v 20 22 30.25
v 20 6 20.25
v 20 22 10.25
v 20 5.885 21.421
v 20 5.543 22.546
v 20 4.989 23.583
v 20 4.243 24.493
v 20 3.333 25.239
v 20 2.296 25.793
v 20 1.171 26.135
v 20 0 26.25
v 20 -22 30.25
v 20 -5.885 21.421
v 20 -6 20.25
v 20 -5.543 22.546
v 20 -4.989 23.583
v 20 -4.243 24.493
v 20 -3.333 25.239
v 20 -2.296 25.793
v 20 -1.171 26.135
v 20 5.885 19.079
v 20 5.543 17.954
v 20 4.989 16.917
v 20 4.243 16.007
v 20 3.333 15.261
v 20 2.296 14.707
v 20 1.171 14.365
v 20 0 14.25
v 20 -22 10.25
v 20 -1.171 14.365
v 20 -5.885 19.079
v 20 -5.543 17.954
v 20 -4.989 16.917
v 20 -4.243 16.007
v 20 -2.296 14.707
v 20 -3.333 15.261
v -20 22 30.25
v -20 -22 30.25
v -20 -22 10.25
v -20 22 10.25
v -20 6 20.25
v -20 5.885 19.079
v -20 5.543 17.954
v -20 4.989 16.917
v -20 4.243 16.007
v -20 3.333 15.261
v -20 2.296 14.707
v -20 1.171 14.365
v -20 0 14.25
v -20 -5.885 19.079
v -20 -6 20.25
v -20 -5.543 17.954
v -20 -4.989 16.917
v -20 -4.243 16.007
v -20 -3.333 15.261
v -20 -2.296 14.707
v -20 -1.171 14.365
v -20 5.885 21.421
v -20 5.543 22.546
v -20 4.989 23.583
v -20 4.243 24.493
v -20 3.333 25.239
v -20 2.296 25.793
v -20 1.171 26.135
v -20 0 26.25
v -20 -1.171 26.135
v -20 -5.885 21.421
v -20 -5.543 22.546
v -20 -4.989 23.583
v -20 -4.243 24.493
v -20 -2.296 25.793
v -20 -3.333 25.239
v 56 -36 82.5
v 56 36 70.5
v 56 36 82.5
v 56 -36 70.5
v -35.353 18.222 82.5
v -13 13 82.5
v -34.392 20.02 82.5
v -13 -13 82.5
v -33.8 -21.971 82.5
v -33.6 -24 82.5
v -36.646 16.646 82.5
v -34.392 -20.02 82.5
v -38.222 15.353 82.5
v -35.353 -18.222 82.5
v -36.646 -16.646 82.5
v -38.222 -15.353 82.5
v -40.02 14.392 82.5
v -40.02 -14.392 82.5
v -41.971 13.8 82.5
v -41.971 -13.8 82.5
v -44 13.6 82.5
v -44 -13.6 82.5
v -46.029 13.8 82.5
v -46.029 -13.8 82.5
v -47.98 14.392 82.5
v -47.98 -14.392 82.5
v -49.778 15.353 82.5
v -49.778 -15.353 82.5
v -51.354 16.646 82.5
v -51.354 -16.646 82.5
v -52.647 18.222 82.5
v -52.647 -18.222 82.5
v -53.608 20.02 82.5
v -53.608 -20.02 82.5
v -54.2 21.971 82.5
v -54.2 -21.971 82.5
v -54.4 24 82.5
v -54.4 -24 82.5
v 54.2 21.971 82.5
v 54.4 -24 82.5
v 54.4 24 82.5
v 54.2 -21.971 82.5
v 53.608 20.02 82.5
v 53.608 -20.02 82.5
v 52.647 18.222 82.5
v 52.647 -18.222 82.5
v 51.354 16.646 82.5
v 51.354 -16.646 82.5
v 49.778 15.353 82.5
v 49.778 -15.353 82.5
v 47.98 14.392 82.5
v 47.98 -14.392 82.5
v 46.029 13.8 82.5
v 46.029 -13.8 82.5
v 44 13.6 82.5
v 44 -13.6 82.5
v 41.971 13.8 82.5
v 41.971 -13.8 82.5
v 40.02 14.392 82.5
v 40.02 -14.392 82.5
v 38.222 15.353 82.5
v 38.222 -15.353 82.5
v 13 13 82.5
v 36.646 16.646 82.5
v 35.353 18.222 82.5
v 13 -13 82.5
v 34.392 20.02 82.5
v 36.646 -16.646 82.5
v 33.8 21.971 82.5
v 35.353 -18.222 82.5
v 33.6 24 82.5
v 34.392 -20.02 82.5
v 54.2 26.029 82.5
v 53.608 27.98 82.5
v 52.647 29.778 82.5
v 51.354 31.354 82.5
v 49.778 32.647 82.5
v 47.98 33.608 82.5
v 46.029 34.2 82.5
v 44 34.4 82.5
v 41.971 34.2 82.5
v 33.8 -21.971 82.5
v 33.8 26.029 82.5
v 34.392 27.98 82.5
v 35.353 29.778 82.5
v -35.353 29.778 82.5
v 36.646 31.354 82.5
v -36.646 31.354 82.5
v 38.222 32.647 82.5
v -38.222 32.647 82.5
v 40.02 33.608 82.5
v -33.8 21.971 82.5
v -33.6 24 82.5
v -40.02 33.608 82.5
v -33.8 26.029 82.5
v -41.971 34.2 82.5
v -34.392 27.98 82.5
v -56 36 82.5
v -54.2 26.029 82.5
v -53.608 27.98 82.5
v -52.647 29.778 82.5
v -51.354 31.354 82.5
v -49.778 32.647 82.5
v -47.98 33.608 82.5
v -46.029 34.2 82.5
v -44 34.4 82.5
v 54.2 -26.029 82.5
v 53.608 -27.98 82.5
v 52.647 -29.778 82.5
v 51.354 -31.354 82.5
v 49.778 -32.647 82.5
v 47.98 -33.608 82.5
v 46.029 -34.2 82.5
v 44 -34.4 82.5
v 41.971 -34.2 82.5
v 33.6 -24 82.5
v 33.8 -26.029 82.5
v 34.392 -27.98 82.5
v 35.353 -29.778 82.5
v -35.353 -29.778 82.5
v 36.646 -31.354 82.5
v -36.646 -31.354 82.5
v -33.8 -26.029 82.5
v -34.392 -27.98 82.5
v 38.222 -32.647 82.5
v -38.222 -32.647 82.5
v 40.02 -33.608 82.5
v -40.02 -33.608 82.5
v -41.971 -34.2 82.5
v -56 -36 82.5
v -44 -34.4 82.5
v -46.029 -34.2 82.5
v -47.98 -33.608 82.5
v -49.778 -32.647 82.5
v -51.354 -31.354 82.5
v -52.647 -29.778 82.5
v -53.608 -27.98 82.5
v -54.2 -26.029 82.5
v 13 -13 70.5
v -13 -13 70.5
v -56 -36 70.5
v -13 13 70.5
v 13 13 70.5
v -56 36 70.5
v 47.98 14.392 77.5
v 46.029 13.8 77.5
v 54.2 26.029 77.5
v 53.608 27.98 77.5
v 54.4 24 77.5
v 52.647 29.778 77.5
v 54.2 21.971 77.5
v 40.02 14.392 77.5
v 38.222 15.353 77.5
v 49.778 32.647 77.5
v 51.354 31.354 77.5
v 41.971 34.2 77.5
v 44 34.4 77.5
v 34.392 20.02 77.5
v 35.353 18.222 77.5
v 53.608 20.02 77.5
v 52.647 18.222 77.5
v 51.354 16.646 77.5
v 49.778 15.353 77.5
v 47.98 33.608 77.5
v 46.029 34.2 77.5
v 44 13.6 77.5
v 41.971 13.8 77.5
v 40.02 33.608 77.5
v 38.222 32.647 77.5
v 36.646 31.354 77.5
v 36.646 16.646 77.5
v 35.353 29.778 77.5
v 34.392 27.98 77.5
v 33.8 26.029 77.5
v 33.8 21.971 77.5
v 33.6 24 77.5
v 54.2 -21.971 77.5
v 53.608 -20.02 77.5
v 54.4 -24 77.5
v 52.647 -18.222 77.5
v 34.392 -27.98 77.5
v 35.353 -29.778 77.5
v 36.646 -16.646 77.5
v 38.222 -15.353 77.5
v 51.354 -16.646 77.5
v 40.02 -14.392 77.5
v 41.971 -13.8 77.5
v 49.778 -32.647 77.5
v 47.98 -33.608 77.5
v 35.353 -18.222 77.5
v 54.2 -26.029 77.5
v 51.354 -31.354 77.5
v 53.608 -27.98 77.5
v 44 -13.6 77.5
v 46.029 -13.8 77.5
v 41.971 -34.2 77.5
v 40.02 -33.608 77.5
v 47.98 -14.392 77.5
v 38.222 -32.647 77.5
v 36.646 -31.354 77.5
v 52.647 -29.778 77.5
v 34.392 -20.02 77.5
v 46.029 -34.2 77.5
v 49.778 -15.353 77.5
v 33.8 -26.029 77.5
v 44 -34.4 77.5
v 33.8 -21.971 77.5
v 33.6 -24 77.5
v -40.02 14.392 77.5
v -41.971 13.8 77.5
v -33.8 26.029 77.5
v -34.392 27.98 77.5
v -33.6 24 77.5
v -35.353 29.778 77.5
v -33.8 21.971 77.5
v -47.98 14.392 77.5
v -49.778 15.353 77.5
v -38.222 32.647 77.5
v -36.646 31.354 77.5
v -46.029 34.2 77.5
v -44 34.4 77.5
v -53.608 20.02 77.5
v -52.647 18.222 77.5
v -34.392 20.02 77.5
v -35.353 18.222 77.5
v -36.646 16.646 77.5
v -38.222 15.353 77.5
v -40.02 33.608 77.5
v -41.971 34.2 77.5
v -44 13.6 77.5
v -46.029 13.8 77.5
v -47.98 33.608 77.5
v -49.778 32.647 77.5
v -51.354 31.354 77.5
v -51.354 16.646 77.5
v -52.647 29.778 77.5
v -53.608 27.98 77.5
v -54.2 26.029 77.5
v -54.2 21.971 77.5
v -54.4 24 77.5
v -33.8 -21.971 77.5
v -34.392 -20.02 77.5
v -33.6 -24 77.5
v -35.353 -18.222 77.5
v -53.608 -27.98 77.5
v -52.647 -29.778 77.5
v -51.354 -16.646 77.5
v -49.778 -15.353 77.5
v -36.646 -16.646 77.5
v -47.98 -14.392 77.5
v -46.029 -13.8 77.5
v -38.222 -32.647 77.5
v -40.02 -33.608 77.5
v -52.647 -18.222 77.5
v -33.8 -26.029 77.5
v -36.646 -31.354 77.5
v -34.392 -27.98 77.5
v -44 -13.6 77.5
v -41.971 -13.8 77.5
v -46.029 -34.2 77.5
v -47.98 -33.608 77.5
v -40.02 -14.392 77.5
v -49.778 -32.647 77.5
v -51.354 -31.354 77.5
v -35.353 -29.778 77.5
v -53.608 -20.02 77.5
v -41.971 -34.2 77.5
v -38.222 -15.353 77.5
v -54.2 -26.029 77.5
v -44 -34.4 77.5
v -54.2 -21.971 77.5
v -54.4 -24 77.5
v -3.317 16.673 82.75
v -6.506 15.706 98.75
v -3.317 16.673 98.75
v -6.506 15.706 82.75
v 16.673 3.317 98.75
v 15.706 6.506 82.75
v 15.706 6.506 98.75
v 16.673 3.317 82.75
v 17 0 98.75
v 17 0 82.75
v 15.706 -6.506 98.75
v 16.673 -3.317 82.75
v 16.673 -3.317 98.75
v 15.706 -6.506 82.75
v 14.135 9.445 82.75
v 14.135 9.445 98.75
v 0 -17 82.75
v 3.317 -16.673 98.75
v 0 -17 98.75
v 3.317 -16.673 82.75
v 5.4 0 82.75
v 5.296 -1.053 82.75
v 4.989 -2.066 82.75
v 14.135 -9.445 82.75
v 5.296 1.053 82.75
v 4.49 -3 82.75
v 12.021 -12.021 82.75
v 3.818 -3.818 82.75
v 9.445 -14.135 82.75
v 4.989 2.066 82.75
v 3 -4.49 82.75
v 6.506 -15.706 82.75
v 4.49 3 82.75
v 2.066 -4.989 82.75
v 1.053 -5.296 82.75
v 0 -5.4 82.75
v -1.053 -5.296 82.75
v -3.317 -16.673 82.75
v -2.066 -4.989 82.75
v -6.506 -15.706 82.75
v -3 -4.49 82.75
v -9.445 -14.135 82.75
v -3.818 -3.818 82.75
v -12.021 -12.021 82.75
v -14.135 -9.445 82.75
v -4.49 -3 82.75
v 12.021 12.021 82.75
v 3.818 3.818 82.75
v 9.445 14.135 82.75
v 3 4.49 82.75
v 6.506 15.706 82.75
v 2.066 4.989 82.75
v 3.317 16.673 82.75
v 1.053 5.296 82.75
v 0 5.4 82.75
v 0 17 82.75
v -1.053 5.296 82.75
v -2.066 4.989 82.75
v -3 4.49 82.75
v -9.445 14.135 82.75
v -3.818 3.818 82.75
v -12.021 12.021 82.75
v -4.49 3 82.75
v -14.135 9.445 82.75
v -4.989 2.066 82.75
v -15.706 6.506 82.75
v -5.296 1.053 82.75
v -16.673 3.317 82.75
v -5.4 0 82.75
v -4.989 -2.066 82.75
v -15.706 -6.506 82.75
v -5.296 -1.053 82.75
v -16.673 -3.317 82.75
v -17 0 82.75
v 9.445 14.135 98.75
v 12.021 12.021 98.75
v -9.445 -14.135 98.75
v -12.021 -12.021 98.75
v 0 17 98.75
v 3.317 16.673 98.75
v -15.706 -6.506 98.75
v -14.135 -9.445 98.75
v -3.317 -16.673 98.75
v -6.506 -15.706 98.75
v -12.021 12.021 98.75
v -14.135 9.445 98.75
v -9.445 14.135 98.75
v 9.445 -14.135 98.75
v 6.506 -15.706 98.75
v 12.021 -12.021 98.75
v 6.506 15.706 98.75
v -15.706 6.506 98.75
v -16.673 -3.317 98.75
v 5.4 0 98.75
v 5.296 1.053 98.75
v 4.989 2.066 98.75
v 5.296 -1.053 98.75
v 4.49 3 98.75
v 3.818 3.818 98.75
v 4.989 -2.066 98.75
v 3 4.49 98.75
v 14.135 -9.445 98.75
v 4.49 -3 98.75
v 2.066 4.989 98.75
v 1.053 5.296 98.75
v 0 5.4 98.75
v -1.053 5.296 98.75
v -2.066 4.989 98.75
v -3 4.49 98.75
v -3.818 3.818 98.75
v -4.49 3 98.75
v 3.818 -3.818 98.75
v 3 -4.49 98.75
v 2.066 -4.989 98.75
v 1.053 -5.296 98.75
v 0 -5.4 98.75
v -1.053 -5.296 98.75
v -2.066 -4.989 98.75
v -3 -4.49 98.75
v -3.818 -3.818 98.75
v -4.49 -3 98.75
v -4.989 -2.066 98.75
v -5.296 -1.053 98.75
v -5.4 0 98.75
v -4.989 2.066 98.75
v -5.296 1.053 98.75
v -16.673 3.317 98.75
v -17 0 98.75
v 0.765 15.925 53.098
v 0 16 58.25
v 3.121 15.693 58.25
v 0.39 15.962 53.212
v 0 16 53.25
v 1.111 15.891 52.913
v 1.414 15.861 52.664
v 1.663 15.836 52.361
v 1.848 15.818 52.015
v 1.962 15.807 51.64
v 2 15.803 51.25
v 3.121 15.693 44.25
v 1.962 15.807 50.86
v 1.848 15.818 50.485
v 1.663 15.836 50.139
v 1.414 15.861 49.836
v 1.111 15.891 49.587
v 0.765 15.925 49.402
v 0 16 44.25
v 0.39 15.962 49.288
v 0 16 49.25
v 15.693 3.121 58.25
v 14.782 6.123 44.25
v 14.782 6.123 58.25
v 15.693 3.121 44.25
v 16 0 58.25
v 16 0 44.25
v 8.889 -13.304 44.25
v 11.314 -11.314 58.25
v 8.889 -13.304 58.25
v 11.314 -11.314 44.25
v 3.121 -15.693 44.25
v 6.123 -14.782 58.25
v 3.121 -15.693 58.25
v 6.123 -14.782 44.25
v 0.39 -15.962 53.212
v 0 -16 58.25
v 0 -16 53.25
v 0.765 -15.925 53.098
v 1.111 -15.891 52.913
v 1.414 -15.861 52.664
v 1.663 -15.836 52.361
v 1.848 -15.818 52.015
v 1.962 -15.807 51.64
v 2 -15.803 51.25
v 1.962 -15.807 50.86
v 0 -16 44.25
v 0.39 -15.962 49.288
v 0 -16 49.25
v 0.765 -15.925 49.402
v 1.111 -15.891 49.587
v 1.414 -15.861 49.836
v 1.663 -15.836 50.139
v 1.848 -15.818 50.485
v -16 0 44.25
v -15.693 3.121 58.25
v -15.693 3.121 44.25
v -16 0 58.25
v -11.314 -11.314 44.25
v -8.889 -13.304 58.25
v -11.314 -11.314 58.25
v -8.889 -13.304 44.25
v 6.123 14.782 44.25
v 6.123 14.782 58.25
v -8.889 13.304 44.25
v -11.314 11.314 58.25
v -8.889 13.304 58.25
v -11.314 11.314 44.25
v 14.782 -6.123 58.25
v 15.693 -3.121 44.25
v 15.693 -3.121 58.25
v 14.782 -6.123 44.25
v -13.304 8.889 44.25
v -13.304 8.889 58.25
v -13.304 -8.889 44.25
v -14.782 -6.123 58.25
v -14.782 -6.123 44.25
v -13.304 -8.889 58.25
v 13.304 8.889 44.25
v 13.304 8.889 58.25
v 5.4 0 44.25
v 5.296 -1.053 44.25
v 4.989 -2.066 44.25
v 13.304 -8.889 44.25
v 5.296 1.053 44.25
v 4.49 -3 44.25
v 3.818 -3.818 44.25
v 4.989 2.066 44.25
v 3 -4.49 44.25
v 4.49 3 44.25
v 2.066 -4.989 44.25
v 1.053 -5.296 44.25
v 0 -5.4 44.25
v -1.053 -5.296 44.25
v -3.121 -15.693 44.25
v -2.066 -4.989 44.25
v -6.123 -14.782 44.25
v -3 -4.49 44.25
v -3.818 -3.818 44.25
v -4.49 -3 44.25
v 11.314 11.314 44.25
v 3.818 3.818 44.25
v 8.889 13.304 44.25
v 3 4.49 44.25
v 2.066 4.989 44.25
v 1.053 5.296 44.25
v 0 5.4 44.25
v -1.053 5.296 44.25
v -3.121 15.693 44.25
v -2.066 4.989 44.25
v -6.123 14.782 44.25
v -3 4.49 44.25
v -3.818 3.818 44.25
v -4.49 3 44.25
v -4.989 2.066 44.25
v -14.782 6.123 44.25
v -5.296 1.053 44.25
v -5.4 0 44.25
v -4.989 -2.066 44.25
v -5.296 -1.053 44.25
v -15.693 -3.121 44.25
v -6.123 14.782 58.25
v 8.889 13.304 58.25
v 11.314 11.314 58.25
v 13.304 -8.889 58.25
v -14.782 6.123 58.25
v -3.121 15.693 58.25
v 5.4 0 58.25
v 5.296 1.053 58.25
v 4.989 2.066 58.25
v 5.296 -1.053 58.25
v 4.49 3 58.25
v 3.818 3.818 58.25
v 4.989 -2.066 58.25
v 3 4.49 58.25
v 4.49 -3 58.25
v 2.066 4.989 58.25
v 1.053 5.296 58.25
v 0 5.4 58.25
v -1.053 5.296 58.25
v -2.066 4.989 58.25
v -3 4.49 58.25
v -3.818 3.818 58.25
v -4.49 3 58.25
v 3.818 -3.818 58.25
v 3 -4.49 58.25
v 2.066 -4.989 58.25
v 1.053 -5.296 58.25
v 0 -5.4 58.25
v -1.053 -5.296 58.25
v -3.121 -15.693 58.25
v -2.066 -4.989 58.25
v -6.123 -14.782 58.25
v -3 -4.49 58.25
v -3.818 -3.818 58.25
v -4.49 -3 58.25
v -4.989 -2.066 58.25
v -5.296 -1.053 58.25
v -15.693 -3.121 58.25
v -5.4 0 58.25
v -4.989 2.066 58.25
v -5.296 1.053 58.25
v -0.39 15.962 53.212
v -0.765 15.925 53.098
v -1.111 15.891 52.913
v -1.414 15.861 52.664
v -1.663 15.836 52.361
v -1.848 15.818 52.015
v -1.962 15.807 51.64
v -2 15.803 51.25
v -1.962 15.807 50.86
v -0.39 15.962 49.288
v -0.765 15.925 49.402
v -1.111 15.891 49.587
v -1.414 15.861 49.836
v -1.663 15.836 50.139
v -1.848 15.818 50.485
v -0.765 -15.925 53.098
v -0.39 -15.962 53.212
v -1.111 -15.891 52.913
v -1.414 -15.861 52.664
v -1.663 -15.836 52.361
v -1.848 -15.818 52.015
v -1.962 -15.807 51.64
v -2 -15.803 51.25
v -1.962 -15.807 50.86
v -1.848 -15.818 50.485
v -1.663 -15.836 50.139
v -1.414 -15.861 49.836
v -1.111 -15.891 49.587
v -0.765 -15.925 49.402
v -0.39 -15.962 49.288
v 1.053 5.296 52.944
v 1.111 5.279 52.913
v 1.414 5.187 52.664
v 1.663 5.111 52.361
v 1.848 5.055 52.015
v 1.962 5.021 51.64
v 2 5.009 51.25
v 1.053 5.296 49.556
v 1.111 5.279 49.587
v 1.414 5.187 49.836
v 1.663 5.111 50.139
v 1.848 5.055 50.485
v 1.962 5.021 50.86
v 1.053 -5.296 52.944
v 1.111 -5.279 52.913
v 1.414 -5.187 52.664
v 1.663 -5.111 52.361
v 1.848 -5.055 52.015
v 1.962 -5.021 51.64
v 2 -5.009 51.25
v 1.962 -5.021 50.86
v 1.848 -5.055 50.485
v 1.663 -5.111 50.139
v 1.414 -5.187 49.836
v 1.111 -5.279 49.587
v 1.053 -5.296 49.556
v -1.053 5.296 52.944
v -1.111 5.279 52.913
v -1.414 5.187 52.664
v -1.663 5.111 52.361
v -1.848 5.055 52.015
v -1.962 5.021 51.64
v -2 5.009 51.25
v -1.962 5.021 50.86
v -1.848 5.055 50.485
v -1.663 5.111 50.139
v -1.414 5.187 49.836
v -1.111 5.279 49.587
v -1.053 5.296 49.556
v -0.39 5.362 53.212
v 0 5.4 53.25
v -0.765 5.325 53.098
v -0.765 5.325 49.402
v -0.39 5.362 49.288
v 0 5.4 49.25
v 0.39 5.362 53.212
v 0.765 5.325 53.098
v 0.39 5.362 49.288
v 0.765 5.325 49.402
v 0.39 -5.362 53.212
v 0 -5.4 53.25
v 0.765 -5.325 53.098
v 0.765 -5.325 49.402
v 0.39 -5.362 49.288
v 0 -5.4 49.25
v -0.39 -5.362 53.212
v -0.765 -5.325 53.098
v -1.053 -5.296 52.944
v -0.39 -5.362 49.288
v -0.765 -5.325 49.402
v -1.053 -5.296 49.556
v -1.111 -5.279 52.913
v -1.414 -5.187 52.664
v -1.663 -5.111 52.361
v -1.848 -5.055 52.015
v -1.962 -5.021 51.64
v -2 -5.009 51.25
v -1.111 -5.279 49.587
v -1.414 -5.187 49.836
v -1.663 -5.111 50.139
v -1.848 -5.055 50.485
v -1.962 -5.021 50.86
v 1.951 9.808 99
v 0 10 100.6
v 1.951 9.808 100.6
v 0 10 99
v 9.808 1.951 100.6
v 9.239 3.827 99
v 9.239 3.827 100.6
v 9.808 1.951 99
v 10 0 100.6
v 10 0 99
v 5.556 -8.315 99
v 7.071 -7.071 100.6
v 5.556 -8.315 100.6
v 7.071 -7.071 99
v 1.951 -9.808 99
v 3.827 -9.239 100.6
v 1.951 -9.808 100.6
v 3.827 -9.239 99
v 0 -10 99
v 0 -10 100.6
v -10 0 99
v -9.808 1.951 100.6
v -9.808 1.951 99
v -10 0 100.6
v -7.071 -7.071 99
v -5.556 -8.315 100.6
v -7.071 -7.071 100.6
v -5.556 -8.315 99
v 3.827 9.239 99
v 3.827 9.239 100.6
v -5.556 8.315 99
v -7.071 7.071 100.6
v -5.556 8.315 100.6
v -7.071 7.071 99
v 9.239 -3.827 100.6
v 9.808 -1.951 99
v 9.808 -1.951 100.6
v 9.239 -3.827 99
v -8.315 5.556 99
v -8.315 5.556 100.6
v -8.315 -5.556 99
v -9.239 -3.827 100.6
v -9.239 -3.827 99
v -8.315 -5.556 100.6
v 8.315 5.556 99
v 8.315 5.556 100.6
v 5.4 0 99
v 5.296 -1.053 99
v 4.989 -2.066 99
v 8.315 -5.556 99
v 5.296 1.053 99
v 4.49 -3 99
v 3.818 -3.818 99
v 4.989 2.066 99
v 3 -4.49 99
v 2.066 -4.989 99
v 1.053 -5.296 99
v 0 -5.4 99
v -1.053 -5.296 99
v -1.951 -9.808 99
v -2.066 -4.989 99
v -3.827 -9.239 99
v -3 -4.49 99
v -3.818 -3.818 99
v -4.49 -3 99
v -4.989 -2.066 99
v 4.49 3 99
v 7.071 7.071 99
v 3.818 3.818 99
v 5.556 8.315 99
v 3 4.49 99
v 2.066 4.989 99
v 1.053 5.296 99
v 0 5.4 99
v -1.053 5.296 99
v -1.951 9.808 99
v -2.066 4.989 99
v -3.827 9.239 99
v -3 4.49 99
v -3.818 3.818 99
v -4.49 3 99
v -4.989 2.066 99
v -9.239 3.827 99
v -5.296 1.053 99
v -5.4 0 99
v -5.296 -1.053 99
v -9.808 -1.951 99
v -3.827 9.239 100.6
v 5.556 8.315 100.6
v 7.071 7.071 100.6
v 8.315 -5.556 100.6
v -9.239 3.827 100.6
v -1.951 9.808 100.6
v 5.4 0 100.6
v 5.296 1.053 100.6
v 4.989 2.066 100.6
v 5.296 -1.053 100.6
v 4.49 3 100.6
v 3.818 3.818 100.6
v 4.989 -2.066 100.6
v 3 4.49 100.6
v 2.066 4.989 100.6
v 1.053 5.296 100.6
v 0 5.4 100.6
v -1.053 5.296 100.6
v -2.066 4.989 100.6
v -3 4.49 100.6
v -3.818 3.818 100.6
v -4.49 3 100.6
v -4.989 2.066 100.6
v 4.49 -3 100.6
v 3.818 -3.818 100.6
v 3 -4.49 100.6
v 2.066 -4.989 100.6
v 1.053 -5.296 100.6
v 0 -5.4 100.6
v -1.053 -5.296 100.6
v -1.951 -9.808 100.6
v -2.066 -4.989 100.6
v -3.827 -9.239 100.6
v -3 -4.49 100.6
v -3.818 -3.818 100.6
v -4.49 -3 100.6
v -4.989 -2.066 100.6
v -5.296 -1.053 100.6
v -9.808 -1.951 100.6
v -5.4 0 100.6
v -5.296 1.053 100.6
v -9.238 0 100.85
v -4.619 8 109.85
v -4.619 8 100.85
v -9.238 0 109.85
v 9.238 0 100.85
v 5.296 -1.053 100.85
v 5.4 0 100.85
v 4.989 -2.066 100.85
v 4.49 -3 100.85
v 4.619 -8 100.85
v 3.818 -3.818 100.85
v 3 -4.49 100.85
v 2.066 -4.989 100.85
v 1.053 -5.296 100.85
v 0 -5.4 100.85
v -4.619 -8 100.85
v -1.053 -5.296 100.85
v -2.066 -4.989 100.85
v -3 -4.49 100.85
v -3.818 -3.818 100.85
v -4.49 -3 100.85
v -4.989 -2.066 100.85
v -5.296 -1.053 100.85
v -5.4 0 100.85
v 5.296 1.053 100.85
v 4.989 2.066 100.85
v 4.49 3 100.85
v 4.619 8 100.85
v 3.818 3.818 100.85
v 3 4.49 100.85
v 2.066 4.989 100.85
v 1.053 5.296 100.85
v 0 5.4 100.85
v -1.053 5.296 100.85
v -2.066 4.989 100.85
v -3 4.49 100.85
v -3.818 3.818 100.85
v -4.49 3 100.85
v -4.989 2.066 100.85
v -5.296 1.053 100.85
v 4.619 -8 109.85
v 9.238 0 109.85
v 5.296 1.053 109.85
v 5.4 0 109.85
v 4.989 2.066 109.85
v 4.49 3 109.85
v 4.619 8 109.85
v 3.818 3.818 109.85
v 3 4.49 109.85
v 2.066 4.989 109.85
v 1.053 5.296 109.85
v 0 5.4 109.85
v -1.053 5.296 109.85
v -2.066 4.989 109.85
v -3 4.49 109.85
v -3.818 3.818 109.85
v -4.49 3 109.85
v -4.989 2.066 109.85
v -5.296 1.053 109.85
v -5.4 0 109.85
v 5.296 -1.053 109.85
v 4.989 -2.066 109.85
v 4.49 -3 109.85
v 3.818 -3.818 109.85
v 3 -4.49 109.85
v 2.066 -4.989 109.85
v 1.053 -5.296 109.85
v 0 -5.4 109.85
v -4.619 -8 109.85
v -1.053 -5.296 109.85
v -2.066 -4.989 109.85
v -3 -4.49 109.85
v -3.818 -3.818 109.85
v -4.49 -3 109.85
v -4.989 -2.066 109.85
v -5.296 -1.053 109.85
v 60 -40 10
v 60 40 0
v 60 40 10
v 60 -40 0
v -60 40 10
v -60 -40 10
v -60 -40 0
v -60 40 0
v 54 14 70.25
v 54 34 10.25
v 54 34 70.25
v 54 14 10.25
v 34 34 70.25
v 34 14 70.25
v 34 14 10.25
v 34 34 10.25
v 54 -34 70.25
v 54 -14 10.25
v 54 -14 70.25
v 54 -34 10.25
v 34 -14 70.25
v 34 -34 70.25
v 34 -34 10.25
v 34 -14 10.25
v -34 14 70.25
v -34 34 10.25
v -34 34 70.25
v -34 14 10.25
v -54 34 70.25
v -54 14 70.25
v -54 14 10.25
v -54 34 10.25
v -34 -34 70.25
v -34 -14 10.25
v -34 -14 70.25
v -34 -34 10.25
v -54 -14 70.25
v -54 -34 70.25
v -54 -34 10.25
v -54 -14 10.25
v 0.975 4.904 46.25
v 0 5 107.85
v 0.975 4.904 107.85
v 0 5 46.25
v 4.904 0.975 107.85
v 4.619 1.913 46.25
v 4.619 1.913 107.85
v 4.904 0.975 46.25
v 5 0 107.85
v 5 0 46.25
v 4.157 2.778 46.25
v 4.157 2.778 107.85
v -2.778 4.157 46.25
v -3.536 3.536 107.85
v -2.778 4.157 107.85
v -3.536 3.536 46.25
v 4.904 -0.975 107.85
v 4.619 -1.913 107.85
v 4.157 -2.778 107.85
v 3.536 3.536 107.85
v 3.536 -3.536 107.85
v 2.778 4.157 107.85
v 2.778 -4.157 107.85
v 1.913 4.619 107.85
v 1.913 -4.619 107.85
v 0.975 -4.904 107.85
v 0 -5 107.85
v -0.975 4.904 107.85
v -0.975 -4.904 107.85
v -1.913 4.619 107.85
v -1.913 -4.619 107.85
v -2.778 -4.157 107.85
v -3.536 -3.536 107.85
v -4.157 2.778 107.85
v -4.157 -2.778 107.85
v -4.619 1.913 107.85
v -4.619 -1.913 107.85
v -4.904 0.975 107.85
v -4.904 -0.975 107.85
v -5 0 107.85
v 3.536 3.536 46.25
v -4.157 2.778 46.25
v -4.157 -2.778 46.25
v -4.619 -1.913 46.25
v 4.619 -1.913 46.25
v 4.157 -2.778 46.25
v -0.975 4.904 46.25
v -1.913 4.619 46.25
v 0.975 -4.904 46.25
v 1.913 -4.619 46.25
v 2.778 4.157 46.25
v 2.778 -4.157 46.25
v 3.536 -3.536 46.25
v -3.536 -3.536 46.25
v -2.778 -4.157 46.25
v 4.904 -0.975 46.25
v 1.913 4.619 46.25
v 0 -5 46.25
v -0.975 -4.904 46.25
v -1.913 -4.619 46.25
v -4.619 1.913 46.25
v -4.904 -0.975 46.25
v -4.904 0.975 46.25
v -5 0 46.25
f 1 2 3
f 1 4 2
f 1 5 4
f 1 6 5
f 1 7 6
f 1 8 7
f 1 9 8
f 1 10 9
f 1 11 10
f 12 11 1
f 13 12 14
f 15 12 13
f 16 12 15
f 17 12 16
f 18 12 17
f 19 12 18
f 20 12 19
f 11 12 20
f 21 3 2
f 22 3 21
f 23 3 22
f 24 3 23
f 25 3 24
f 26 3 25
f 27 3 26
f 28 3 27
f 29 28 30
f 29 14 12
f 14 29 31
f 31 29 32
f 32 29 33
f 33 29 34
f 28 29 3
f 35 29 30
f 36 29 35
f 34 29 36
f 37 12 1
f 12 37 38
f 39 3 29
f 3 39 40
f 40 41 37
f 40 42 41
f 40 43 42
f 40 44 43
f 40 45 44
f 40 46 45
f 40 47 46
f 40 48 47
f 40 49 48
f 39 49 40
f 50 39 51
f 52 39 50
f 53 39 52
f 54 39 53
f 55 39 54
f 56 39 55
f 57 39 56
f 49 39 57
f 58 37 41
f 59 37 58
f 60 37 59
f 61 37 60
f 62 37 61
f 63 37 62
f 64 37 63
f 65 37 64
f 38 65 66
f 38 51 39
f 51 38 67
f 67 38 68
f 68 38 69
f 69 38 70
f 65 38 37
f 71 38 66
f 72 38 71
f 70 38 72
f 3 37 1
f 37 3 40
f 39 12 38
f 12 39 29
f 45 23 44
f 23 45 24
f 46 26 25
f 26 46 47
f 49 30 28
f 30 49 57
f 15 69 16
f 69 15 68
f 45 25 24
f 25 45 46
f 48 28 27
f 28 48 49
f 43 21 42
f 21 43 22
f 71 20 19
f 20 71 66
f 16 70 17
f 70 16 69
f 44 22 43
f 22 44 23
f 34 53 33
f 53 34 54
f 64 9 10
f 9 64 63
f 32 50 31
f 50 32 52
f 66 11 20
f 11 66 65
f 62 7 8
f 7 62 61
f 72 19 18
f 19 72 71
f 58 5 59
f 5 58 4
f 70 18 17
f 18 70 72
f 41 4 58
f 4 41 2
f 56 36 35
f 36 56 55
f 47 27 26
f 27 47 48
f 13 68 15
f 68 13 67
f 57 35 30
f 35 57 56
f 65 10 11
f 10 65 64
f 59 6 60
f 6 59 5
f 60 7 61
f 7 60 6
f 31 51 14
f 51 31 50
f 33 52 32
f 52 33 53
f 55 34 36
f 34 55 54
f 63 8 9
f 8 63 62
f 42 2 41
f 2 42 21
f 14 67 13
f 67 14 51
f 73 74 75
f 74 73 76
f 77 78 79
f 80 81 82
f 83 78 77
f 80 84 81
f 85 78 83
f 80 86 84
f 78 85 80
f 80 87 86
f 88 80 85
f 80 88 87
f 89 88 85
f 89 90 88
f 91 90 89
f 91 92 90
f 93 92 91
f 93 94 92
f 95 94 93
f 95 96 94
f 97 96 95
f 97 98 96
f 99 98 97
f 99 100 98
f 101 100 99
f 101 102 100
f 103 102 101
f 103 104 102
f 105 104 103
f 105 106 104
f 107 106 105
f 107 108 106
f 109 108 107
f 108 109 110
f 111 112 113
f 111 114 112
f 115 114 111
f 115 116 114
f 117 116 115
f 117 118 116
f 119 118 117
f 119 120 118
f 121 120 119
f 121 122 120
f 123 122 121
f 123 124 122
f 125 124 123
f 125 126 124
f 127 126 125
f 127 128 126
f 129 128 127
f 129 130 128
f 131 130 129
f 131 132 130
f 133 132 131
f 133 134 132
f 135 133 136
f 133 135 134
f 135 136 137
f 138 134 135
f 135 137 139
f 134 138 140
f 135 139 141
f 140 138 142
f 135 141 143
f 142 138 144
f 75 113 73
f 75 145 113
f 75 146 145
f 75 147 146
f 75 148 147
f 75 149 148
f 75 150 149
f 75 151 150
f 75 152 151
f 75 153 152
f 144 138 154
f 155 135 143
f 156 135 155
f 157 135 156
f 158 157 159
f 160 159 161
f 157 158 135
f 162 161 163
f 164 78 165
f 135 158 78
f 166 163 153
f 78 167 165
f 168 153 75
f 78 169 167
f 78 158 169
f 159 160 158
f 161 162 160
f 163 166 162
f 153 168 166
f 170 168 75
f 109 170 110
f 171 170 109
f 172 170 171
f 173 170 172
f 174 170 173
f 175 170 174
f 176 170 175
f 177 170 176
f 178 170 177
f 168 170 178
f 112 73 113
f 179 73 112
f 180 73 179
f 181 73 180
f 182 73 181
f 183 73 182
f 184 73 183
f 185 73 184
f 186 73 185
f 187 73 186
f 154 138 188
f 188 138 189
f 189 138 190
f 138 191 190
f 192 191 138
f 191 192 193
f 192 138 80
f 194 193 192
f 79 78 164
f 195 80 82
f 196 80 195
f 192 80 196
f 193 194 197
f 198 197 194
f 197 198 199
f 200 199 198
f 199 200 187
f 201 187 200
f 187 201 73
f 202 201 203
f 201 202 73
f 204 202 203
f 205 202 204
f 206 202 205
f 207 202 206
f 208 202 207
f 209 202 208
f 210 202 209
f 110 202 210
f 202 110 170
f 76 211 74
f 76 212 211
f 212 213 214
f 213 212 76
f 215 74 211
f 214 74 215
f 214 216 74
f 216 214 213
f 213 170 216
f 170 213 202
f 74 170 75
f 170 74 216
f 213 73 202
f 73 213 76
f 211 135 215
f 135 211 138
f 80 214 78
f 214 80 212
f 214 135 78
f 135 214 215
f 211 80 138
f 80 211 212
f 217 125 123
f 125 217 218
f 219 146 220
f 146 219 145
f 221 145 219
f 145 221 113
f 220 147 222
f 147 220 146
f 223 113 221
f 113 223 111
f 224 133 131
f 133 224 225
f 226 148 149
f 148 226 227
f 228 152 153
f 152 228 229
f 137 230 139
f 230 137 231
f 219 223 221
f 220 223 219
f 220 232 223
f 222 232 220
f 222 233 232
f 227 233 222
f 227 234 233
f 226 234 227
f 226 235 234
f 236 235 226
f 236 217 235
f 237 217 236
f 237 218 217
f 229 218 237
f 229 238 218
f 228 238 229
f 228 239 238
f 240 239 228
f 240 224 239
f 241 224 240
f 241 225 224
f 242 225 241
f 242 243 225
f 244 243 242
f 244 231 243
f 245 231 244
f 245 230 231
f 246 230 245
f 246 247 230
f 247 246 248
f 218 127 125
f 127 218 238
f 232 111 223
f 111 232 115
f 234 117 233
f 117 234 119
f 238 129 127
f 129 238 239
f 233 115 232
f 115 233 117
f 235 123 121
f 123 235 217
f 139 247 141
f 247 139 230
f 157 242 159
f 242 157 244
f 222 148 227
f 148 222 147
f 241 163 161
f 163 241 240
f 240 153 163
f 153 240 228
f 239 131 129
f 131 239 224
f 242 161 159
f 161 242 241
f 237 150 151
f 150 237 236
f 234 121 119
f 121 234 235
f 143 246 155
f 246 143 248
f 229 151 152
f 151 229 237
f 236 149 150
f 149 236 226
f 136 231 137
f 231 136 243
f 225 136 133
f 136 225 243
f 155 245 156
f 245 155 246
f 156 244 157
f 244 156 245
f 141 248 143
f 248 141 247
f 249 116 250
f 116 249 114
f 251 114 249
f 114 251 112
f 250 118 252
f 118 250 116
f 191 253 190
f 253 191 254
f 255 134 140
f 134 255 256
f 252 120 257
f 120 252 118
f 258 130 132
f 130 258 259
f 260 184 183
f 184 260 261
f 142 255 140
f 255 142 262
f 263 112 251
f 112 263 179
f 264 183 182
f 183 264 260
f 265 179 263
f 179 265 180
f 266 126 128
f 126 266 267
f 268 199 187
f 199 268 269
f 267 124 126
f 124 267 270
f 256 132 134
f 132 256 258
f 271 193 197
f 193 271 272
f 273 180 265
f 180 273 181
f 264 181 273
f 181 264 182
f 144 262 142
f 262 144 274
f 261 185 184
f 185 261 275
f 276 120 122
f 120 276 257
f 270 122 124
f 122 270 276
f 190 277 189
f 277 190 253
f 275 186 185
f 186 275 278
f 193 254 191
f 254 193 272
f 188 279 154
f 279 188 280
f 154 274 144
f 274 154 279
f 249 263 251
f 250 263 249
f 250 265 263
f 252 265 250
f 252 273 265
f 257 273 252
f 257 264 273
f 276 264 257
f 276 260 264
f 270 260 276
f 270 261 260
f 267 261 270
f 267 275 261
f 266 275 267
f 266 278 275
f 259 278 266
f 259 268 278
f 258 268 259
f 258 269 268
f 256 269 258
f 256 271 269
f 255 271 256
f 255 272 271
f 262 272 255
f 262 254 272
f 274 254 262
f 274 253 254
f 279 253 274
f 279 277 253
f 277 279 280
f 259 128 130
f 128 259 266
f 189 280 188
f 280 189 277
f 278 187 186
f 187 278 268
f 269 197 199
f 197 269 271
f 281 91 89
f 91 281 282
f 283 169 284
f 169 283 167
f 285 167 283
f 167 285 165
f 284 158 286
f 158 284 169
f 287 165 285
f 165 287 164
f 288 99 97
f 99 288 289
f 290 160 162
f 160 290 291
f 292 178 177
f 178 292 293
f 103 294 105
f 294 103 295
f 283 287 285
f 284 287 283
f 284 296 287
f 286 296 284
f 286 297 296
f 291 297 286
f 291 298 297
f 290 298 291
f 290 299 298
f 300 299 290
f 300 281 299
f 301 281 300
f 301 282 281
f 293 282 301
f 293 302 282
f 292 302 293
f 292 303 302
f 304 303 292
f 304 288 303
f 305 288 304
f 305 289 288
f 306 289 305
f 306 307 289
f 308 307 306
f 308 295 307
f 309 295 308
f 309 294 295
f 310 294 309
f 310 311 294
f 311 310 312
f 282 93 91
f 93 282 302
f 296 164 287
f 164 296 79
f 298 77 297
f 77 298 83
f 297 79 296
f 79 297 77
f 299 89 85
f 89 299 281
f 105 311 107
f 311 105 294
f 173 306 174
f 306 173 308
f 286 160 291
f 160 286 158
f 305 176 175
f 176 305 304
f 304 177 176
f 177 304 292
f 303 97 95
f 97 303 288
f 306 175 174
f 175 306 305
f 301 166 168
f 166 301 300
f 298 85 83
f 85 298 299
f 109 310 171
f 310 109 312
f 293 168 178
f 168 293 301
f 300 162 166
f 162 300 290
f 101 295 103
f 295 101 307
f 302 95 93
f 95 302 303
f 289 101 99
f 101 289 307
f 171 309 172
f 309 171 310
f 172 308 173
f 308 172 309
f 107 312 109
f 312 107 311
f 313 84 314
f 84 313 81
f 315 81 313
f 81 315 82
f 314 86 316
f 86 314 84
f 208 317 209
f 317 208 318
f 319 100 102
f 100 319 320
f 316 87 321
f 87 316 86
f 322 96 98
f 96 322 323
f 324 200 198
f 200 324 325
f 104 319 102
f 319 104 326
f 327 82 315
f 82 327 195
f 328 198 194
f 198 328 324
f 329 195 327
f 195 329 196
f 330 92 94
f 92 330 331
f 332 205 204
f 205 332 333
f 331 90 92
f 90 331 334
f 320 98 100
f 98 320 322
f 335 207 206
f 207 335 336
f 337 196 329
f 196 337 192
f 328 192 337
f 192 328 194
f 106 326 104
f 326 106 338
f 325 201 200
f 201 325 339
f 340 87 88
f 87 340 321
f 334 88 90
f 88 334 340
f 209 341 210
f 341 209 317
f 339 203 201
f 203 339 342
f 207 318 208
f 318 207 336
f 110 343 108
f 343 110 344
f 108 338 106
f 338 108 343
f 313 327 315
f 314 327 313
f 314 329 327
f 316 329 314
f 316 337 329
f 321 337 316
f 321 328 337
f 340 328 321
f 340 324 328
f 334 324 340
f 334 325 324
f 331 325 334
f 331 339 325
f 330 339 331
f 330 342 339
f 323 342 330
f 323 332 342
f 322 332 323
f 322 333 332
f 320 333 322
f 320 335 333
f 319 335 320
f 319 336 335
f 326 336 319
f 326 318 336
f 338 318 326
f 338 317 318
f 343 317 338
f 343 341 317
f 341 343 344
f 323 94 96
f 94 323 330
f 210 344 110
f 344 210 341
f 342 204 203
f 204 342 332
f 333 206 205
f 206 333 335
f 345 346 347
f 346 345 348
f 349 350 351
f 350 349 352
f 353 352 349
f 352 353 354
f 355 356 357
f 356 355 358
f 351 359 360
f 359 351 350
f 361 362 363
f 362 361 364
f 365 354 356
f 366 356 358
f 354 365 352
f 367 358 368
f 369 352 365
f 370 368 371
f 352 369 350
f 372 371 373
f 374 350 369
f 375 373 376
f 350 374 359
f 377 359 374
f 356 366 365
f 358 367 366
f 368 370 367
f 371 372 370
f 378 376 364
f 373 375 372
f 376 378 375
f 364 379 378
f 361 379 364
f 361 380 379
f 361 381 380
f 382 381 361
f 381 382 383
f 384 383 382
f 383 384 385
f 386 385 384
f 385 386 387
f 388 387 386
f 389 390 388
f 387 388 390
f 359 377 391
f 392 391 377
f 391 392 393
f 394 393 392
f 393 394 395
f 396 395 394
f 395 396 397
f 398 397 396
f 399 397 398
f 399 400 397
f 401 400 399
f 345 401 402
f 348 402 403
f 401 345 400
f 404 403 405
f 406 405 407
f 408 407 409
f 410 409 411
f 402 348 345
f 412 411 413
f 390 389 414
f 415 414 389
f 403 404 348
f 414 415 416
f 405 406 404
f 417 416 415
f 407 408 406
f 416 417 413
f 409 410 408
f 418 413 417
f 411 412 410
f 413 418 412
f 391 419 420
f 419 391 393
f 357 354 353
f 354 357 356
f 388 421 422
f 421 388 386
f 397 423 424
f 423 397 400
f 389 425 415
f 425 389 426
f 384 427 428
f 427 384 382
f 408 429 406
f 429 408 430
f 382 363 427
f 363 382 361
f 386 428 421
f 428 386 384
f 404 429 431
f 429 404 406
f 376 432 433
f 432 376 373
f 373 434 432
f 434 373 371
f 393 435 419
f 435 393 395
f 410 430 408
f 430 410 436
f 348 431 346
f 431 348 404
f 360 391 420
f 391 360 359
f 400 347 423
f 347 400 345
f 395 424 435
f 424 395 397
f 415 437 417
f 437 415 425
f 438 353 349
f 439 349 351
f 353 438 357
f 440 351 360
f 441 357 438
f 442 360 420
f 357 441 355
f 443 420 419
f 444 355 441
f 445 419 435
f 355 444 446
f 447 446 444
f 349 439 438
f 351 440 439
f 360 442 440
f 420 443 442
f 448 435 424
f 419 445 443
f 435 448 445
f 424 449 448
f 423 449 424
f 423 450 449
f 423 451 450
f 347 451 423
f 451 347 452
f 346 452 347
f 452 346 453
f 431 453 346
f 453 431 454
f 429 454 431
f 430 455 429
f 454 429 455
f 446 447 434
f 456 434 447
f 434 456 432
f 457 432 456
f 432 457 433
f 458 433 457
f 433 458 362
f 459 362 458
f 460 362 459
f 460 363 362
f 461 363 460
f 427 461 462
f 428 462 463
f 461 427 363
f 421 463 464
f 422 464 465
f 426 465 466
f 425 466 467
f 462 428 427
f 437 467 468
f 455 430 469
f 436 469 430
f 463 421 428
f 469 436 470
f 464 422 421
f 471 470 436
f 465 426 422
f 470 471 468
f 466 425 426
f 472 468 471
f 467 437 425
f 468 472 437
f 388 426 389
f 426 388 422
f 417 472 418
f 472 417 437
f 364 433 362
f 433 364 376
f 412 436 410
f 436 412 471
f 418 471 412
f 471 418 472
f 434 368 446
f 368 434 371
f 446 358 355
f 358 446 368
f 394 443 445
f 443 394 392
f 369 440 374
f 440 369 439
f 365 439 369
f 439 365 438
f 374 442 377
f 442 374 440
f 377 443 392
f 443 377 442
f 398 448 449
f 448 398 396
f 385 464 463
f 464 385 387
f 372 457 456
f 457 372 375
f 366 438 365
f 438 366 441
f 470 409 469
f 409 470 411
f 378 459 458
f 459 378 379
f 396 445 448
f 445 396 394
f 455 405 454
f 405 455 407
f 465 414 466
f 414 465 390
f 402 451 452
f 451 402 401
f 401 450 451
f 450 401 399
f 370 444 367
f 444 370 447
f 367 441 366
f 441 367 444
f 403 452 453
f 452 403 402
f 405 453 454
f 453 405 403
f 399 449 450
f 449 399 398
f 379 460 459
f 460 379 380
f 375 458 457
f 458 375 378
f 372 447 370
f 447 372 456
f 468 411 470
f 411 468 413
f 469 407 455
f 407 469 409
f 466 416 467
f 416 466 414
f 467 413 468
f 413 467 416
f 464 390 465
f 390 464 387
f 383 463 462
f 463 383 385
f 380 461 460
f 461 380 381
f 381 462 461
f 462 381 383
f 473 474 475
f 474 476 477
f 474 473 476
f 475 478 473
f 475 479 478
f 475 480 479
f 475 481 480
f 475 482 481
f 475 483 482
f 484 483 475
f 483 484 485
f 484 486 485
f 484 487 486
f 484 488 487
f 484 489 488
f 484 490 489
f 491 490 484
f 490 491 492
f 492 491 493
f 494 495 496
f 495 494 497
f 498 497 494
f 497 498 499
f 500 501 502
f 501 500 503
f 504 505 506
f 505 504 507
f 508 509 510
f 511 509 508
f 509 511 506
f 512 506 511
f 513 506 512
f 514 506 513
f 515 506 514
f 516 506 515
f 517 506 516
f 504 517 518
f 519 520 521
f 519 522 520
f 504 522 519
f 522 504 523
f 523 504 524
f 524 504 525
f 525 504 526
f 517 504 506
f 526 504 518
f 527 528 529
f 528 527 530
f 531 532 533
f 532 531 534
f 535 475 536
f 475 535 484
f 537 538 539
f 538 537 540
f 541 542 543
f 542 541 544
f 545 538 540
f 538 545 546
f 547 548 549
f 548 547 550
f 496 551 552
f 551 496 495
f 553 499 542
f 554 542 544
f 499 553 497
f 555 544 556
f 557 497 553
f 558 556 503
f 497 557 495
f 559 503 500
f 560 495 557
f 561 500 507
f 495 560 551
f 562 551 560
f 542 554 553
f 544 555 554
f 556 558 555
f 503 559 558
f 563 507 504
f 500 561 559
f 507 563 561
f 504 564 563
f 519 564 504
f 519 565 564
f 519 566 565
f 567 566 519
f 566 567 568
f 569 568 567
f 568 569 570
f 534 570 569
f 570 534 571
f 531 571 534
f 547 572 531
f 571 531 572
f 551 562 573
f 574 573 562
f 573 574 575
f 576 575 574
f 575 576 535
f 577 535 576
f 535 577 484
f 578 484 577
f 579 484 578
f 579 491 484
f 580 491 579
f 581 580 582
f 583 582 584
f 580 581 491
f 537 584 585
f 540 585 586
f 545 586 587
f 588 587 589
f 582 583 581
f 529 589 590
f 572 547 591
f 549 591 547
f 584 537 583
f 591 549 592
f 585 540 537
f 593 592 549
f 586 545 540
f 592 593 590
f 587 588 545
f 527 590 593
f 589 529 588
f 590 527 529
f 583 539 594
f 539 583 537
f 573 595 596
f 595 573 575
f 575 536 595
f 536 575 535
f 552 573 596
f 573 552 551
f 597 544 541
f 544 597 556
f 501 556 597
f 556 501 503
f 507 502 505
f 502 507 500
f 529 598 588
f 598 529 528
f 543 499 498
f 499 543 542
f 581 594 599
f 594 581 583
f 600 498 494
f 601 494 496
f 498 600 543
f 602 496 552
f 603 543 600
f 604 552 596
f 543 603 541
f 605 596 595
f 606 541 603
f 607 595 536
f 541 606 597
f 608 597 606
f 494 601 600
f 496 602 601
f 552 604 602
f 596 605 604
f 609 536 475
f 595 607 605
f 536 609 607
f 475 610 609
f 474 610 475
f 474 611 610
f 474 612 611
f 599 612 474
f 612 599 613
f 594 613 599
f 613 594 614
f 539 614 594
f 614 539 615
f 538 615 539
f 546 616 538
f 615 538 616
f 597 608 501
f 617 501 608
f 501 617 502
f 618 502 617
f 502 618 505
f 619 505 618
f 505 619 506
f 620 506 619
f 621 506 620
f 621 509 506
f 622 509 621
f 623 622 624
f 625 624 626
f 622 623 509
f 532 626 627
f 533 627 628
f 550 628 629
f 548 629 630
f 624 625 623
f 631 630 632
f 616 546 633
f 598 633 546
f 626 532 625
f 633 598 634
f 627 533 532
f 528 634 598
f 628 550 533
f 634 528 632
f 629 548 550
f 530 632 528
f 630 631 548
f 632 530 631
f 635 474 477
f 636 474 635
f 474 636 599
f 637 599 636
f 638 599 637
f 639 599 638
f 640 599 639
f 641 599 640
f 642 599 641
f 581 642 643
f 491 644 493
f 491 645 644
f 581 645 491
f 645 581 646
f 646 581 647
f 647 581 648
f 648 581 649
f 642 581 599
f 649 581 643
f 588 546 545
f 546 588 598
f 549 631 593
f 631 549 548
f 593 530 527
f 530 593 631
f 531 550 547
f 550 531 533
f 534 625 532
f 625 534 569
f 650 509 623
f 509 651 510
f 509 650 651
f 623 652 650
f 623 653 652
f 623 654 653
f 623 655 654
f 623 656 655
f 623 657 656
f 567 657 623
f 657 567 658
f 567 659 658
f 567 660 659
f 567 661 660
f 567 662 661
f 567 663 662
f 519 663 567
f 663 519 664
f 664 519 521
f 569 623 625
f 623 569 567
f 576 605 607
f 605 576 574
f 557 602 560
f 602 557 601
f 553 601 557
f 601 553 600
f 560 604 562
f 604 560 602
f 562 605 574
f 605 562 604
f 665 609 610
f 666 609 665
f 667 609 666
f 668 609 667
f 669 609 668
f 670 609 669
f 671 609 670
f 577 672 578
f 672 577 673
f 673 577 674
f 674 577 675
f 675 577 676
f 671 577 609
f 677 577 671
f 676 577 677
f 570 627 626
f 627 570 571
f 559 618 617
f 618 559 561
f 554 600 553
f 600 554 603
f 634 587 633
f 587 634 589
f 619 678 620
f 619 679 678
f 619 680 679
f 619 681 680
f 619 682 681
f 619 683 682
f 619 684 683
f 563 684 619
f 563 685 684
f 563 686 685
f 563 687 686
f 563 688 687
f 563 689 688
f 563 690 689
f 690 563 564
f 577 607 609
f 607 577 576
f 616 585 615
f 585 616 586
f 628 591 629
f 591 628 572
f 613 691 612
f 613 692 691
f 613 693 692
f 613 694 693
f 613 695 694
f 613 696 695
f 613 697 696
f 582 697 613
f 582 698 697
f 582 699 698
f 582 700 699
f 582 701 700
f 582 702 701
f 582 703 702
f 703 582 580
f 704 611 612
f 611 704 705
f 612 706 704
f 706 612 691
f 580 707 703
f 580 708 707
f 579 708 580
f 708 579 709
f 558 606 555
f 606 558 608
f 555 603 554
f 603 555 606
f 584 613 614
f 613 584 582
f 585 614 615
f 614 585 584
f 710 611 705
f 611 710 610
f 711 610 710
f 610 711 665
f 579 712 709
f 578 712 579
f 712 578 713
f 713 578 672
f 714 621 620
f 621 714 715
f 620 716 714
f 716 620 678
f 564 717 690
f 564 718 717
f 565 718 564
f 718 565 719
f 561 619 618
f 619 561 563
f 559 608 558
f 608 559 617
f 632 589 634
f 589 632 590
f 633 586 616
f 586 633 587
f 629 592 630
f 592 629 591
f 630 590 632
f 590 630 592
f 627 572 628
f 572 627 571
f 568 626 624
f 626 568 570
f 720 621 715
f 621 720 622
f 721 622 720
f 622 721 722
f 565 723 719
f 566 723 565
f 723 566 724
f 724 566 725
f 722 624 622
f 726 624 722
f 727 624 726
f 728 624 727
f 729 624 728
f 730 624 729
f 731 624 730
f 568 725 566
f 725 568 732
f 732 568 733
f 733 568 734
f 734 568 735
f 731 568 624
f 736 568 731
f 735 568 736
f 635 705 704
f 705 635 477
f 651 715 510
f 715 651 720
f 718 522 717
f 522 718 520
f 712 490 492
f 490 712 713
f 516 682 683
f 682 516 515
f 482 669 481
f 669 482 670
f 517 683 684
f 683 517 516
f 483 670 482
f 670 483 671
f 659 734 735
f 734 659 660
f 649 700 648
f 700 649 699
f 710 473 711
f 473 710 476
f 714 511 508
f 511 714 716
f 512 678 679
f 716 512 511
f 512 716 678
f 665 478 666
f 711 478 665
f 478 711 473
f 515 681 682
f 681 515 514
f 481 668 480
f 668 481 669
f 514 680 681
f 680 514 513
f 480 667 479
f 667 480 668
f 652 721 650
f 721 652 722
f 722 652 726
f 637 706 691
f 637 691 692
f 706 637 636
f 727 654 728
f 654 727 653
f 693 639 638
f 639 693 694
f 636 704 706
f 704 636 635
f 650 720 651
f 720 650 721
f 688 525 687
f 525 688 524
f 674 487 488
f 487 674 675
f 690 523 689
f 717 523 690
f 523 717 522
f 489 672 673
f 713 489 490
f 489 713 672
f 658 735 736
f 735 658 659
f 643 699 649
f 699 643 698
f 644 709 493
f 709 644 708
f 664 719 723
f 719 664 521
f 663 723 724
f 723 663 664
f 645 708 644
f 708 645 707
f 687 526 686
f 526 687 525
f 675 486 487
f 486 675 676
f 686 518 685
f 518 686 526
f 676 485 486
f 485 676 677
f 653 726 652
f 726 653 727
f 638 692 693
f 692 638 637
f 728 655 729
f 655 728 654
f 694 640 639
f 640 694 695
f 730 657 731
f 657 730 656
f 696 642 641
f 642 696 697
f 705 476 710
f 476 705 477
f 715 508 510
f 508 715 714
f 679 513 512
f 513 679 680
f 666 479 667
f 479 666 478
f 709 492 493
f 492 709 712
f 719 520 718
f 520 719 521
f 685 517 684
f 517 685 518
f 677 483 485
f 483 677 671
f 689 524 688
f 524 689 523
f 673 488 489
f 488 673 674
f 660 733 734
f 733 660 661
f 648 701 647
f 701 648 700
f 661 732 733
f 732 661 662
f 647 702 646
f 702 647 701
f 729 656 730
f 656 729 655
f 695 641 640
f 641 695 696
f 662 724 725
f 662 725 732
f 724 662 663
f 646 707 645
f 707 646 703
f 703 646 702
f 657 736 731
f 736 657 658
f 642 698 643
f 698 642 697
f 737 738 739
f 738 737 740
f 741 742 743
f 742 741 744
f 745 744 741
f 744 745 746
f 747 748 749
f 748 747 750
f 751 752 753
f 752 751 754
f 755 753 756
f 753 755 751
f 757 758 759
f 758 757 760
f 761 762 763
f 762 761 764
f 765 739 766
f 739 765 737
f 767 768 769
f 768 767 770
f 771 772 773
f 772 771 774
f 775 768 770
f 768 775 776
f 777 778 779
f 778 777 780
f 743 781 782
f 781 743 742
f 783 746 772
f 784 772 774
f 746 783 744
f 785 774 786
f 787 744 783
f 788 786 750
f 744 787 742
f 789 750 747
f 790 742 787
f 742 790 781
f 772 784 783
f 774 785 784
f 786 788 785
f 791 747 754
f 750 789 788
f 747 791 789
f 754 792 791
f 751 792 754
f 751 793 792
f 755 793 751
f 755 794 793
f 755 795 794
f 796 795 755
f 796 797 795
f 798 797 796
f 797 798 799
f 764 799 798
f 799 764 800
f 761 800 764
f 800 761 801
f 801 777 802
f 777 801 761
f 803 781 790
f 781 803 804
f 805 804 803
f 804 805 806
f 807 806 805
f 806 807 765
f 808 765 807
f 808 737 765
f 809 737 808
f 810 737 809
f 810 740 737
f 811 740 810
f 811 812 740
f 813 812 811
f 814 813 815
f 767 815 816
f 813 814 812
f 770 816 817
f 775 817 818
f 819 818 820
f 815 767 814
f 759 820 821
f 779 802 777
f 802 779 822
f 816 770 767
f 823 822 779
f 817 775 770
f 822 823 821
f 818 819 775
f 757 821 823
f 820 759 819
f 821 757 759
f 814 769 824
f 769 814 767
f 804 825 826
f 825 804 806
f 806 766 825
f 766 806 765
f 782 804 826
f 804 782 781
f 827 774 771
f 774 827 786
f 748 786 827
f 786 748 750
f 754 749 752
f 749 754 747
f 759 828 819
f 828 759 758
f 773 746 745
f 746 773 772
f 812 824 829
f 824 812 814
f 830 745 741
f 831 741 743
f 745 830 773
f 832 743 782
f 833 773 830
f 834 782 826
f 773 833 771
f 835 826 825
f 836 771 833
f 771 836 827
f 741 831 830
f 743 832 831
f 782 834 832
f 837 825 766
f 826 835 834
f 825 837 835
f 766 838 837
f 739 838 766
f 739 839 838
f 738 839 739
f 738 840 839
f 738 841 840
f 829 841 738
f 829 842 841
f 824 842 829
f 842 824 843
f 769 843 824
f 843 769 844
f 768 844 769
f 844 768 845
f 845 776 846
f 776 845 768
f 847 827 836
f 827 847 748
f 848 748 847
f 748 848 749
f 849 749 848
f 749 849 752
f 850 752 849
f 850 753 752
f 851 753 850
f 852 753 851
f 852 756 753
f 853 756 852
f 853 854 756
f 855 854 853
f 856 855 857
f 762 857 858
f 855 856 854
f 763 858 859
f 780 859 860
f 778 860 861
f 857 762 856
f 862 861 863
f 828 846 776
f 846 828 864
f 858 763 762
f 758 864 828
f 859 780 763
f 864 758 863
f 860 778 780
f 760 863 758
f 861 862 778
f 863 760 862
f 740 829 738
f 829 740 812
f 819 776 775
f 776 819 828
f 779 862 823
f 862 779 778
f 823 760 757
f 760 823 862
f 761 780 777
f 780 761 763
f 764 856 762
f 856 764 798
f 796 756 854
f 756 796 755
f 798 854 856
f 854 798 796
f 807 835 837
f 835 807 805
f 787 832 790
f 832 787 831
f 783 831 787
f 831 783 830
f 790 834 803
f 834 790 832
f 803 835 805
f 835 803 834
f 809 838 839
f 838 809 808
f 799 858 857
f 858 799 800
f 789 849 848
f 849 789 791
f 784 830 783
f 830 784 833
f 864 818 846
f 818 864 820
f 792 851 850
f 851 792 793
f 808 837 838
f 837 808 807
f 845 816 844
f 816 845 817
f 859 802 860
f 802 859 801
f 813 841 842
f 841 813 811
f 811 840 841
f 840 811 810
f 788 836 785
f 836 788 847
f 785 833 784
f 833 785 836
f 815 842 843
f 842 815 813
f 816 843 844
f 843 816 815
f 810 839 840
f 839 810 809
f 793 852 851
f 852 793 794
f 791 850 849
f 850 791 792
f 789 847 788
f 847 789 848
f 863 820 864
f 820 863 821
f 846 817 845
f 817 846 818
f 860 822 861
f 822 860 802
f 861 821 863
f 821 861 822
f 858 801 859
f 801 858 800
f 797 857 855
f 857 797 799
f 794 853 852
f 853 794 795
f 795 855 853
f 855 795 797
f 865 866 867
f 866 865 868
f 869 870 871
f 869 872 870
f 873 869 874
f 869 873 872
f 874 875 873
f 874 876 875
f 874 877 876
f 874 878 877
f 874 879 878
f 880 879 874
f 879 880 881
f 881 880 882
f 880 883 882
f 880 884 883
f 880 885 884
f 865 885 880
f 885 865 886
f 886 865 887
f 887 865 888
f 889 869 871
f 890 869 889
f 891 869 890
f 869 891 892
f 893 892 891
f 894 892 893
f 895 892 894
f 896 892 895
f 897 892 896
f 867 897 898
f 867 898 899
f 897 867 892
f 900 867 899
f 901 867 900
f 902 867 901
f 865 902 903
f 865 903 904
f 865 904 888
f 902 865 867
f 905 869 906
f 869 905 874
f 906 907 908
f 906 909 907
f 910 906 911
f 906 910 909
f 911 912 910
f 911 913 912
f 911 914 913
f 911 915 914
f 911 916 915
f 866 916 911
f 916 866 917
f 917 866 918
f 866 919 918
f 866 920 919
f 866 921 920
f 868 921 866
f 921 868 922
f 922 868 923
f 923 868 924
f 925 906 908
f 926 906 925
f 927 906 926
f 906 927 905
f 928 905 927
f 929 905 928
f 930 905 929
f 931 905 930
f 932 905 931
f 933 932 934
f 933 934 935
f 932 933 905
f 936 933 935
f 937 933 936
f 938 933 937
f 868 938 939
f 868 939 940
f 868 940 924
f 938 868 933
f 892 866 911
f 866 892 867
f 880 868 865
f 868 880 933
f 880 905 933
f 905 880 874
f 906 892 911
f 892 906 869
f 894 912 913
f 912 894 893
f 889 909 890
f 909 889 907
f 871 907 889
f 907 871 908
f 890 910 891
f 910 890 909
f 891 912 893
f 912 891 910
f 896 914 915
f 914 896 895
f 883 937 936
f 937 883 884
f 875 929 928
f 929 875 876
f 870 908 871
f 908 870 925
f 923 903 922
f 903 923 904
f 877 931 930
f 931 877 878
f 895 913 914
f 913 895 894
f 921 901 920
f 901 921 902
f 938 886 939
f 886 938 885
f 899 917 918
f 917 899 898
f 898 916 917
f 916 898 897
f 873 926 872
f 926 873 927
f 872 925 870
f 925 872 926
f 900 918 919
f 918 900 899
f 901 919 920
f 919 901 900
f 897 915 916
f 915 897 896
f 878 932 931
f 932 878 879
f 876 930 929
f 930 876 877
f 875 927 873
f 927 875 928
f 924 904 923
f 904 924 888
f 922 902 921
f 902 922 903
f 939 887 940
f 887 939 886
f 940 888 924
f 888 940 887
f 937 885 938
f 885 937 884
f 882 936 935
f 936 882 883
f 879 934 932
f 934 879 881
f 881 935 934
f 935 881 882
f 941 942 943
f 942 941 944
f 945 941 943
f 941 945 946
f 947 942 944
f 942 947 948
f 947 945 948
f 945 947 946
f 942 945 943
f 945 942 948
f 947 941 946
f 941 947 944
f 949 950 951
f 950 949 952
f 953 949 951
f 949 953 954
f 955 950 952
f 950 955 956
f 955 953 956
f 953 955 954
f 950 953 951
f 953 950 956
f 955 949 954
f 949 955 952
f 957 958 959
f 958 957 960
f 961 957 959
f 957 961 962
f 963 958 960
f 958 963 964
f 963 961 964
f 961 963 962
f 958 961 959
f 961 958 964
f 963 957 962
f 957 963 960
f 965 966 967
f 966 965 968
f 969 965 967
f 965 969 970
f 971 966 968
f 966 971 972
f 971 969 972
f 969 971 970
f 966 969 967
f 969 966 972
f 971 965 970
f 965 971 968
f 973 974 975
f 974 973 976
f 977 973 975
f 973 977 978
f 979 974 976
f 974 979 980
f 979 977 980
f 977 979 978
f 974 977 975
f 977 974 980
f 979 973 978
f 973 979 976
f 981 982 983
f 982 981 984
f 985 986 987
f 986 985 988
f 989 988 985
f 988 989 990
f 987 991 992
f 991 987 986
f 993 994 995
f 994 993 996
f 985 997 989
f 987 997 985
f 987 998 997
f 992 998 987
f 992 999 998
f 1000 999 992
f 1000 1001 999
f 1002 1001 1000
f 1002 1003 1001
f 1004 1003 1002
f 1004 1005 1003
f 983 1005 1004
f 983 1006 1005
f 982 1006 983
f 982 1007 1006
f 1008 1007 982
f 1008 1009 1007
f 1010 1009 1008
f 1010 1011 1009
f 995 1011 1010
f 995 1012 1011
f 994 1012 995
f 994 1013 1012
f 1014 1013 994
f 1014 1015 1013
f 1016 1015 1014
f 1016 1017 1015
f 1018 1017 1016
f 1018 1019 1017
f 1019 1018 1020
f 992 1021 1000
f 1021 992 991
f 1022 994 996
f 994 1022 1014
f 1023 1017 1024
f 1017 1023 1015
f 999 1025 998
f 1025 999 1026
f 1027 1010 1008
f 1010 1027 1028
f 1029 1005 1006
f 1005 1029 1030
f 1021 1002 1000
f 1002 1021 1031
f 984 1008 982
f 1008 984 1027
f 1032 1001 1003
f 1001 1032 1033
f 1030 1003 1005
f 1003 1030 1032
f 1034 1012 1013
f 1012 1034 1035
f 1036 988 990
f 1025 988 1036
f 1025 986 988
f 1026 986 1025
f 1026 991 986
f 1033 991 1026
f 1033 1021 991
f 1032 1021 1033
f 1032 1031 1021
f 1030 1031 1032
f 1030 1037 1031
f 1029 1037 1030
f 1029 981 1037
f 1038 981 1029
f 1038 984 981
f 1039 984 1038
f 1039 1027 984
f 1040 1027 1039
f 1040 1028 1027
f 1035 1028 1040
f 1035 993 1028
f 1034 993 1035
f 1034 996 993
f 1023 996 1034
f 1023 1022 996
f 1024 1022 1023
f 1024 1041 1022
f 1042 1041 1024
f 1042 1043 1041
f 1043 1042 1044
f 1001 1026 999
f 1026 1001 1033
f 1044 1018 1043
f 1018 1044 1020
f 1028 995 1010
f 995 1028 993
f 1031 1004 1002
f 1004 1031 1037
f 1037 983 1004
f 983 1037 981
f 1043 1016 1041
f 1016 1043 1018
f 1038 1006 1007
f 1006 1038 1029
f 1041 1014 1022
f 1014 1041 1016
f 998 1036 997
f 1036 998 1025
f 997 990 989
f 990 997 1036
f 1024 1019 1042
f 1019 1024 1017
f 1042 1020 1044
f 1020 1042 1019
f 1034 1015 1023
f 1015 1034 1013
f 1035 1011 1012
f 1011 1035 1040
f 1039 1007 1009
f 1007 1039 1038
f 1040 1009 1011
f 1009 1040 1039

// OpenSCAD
$fn = 32;

// ------------------------------------------------------------------------
// Arbor press fixture: screw d10, posts 60 mm, gap 14 mm
// Every part is its own module, assembly() places every instance.
// ------------------------------------------------------------------------

// --- part 1 ---
module press_bed() {
  difference() {
    translate([-60, -40, 0]) cube([120, 80, 10]);
  }
}

// --- part 2 ---
module anvil_block() {
  difference() {
    translate([-20, -22, 0]) cube([40, 44, 20]);
    translate([0, 0, 10]) rotate([0, 90, 0]) cylinder(h = 42, d = 12, center = true);
  }
}

// --- part 3 ---
module press_post_a() {
  translate([-10, -10, 0]) cube([20, 20, 60]);
}

// --- part 4 ---
module press_post_b() {
  translate([-10, -10, 0]) cube([20, 20, 60]);
}

// --- part 5 ---
module press_post_c() {
  translate([-10, -10, 0]) cube([20, 20, 60]);
}

// --- part 6 ---
module press_post_d() {
  translate([-10, -10, 0]) cube([20, 20, 60]);
}

// --- part 7 ---
module press_frame() {
  difference() {
    translate([-56, -36, 0]) cube([112, 72, 12]);
    translate([-13, -13, -1]) cube([26, 26, 14]);
    translate([44, 24, 7]) cylinder(h = 6, d = 20.8);
    translate([44, -24, 7]) cylinder(h = 6, d = 20.8);
    translate([-44, 24, 7]) cylinder(h = 6, d = 20.8);
    translate([-44, -24, 7]) cylinder(h = 6, d = 20.8);
  }
}

// --- part 8 ---
module guide_ring() {
  difference() {
      translate([0, 0, 0]) cylinder(h = 16, d = 34);
      translate([0, 0, -1]) cylinder(h = 18, d = 10.8);
    }
}

// --- part 9 ---
module press_screw() {
  translate([0, 0, -30.8]) cylinder(h = 61.6, d = 10);
}

// --- part 10 ---
module press_head() {
  difference() {
    cylinder(h = 14, d = 32);
    translate([0, 0, -1]) cylinder(h = 16, d = 10.8);
    translate([0, 0, 7]) rotate([90, 0, 0]) cylinder(h = 34, d = 4, center = true);
  }
}

// --- part 11 ---
module nut_washer() {
  difference() {
      translate([0, 0, 0]) cylinder(h = 1.6, d = 20);
      translate([0, 0, -1]) cylinder(h = 3.6, d = 10.8);
    }
}

// --- part 12 ---
module press_nut() {
  difference() {
    linear_extrude(height = 9) polygon(points = [[9.238, 0], [4.619, 8], [-4.619, 8], [-9.238, 0], [-4.619, -8], [4.619, -8]]);
    translate([0, 0, -1]) cylinder(h = 11, d = 10.8);
  }
}

// --- assembly ---
module assembly() {
  color([0.80, 0.24, 0.20]) translate([0, 0, 0]) rotate([0, 0, 0]) press_bed();
  color([0.20, 0.45, 0.75]) translate([0, 0, 10.25]) rotate([0, 0, 0]) anvil_block();
  color([0.25, 0.62, 0.32]) translate([44, 24, 10.25]) rotate([0, 0, 0]) press_post_a();
  color([0.92, 0.70, 0.18]) translate([44, -24, 10.25]) rotate([0, 0, 0]) press_post_b();
  color([0.58, 0.35, 0.70]) translate([-44, 24, 10.25]) rotate([0, 0, 0]) press_post_c();
  color([0.16, 0.66, 0.66]) translate([-44, -24, 10.25]) rotate([0, 0, 0]) press_post_d();
  color([0.85, 0.48, 0.18]) translate([0, 0, 70.5]) rotate([0, 0, 0]) press_frame();
  color([0.55, 0.60, 0.65]) translate([0, 0, 82.75]) rotate([0, 0, 0]) guide_ring();
  color([0.75, 0.30, 0.55]) translate([0, 0, 77.05]) rotate([0, 0, 0]) press_screw();
  color([0.42, 0.52, 0.28]) translate([0, 0, 44.25]) rotate([0, 0, 0]) press_head();
  color([0.80, 0.24, 0.20]) translate([0, 0, 99]) rotate([0, 0, 0]) nut_washer();
  color([0.20, 0.45, 0.75]) translate([0, 0, 100.85]) rotate([0, 0, 0]) press_nut();
}

assembly();
